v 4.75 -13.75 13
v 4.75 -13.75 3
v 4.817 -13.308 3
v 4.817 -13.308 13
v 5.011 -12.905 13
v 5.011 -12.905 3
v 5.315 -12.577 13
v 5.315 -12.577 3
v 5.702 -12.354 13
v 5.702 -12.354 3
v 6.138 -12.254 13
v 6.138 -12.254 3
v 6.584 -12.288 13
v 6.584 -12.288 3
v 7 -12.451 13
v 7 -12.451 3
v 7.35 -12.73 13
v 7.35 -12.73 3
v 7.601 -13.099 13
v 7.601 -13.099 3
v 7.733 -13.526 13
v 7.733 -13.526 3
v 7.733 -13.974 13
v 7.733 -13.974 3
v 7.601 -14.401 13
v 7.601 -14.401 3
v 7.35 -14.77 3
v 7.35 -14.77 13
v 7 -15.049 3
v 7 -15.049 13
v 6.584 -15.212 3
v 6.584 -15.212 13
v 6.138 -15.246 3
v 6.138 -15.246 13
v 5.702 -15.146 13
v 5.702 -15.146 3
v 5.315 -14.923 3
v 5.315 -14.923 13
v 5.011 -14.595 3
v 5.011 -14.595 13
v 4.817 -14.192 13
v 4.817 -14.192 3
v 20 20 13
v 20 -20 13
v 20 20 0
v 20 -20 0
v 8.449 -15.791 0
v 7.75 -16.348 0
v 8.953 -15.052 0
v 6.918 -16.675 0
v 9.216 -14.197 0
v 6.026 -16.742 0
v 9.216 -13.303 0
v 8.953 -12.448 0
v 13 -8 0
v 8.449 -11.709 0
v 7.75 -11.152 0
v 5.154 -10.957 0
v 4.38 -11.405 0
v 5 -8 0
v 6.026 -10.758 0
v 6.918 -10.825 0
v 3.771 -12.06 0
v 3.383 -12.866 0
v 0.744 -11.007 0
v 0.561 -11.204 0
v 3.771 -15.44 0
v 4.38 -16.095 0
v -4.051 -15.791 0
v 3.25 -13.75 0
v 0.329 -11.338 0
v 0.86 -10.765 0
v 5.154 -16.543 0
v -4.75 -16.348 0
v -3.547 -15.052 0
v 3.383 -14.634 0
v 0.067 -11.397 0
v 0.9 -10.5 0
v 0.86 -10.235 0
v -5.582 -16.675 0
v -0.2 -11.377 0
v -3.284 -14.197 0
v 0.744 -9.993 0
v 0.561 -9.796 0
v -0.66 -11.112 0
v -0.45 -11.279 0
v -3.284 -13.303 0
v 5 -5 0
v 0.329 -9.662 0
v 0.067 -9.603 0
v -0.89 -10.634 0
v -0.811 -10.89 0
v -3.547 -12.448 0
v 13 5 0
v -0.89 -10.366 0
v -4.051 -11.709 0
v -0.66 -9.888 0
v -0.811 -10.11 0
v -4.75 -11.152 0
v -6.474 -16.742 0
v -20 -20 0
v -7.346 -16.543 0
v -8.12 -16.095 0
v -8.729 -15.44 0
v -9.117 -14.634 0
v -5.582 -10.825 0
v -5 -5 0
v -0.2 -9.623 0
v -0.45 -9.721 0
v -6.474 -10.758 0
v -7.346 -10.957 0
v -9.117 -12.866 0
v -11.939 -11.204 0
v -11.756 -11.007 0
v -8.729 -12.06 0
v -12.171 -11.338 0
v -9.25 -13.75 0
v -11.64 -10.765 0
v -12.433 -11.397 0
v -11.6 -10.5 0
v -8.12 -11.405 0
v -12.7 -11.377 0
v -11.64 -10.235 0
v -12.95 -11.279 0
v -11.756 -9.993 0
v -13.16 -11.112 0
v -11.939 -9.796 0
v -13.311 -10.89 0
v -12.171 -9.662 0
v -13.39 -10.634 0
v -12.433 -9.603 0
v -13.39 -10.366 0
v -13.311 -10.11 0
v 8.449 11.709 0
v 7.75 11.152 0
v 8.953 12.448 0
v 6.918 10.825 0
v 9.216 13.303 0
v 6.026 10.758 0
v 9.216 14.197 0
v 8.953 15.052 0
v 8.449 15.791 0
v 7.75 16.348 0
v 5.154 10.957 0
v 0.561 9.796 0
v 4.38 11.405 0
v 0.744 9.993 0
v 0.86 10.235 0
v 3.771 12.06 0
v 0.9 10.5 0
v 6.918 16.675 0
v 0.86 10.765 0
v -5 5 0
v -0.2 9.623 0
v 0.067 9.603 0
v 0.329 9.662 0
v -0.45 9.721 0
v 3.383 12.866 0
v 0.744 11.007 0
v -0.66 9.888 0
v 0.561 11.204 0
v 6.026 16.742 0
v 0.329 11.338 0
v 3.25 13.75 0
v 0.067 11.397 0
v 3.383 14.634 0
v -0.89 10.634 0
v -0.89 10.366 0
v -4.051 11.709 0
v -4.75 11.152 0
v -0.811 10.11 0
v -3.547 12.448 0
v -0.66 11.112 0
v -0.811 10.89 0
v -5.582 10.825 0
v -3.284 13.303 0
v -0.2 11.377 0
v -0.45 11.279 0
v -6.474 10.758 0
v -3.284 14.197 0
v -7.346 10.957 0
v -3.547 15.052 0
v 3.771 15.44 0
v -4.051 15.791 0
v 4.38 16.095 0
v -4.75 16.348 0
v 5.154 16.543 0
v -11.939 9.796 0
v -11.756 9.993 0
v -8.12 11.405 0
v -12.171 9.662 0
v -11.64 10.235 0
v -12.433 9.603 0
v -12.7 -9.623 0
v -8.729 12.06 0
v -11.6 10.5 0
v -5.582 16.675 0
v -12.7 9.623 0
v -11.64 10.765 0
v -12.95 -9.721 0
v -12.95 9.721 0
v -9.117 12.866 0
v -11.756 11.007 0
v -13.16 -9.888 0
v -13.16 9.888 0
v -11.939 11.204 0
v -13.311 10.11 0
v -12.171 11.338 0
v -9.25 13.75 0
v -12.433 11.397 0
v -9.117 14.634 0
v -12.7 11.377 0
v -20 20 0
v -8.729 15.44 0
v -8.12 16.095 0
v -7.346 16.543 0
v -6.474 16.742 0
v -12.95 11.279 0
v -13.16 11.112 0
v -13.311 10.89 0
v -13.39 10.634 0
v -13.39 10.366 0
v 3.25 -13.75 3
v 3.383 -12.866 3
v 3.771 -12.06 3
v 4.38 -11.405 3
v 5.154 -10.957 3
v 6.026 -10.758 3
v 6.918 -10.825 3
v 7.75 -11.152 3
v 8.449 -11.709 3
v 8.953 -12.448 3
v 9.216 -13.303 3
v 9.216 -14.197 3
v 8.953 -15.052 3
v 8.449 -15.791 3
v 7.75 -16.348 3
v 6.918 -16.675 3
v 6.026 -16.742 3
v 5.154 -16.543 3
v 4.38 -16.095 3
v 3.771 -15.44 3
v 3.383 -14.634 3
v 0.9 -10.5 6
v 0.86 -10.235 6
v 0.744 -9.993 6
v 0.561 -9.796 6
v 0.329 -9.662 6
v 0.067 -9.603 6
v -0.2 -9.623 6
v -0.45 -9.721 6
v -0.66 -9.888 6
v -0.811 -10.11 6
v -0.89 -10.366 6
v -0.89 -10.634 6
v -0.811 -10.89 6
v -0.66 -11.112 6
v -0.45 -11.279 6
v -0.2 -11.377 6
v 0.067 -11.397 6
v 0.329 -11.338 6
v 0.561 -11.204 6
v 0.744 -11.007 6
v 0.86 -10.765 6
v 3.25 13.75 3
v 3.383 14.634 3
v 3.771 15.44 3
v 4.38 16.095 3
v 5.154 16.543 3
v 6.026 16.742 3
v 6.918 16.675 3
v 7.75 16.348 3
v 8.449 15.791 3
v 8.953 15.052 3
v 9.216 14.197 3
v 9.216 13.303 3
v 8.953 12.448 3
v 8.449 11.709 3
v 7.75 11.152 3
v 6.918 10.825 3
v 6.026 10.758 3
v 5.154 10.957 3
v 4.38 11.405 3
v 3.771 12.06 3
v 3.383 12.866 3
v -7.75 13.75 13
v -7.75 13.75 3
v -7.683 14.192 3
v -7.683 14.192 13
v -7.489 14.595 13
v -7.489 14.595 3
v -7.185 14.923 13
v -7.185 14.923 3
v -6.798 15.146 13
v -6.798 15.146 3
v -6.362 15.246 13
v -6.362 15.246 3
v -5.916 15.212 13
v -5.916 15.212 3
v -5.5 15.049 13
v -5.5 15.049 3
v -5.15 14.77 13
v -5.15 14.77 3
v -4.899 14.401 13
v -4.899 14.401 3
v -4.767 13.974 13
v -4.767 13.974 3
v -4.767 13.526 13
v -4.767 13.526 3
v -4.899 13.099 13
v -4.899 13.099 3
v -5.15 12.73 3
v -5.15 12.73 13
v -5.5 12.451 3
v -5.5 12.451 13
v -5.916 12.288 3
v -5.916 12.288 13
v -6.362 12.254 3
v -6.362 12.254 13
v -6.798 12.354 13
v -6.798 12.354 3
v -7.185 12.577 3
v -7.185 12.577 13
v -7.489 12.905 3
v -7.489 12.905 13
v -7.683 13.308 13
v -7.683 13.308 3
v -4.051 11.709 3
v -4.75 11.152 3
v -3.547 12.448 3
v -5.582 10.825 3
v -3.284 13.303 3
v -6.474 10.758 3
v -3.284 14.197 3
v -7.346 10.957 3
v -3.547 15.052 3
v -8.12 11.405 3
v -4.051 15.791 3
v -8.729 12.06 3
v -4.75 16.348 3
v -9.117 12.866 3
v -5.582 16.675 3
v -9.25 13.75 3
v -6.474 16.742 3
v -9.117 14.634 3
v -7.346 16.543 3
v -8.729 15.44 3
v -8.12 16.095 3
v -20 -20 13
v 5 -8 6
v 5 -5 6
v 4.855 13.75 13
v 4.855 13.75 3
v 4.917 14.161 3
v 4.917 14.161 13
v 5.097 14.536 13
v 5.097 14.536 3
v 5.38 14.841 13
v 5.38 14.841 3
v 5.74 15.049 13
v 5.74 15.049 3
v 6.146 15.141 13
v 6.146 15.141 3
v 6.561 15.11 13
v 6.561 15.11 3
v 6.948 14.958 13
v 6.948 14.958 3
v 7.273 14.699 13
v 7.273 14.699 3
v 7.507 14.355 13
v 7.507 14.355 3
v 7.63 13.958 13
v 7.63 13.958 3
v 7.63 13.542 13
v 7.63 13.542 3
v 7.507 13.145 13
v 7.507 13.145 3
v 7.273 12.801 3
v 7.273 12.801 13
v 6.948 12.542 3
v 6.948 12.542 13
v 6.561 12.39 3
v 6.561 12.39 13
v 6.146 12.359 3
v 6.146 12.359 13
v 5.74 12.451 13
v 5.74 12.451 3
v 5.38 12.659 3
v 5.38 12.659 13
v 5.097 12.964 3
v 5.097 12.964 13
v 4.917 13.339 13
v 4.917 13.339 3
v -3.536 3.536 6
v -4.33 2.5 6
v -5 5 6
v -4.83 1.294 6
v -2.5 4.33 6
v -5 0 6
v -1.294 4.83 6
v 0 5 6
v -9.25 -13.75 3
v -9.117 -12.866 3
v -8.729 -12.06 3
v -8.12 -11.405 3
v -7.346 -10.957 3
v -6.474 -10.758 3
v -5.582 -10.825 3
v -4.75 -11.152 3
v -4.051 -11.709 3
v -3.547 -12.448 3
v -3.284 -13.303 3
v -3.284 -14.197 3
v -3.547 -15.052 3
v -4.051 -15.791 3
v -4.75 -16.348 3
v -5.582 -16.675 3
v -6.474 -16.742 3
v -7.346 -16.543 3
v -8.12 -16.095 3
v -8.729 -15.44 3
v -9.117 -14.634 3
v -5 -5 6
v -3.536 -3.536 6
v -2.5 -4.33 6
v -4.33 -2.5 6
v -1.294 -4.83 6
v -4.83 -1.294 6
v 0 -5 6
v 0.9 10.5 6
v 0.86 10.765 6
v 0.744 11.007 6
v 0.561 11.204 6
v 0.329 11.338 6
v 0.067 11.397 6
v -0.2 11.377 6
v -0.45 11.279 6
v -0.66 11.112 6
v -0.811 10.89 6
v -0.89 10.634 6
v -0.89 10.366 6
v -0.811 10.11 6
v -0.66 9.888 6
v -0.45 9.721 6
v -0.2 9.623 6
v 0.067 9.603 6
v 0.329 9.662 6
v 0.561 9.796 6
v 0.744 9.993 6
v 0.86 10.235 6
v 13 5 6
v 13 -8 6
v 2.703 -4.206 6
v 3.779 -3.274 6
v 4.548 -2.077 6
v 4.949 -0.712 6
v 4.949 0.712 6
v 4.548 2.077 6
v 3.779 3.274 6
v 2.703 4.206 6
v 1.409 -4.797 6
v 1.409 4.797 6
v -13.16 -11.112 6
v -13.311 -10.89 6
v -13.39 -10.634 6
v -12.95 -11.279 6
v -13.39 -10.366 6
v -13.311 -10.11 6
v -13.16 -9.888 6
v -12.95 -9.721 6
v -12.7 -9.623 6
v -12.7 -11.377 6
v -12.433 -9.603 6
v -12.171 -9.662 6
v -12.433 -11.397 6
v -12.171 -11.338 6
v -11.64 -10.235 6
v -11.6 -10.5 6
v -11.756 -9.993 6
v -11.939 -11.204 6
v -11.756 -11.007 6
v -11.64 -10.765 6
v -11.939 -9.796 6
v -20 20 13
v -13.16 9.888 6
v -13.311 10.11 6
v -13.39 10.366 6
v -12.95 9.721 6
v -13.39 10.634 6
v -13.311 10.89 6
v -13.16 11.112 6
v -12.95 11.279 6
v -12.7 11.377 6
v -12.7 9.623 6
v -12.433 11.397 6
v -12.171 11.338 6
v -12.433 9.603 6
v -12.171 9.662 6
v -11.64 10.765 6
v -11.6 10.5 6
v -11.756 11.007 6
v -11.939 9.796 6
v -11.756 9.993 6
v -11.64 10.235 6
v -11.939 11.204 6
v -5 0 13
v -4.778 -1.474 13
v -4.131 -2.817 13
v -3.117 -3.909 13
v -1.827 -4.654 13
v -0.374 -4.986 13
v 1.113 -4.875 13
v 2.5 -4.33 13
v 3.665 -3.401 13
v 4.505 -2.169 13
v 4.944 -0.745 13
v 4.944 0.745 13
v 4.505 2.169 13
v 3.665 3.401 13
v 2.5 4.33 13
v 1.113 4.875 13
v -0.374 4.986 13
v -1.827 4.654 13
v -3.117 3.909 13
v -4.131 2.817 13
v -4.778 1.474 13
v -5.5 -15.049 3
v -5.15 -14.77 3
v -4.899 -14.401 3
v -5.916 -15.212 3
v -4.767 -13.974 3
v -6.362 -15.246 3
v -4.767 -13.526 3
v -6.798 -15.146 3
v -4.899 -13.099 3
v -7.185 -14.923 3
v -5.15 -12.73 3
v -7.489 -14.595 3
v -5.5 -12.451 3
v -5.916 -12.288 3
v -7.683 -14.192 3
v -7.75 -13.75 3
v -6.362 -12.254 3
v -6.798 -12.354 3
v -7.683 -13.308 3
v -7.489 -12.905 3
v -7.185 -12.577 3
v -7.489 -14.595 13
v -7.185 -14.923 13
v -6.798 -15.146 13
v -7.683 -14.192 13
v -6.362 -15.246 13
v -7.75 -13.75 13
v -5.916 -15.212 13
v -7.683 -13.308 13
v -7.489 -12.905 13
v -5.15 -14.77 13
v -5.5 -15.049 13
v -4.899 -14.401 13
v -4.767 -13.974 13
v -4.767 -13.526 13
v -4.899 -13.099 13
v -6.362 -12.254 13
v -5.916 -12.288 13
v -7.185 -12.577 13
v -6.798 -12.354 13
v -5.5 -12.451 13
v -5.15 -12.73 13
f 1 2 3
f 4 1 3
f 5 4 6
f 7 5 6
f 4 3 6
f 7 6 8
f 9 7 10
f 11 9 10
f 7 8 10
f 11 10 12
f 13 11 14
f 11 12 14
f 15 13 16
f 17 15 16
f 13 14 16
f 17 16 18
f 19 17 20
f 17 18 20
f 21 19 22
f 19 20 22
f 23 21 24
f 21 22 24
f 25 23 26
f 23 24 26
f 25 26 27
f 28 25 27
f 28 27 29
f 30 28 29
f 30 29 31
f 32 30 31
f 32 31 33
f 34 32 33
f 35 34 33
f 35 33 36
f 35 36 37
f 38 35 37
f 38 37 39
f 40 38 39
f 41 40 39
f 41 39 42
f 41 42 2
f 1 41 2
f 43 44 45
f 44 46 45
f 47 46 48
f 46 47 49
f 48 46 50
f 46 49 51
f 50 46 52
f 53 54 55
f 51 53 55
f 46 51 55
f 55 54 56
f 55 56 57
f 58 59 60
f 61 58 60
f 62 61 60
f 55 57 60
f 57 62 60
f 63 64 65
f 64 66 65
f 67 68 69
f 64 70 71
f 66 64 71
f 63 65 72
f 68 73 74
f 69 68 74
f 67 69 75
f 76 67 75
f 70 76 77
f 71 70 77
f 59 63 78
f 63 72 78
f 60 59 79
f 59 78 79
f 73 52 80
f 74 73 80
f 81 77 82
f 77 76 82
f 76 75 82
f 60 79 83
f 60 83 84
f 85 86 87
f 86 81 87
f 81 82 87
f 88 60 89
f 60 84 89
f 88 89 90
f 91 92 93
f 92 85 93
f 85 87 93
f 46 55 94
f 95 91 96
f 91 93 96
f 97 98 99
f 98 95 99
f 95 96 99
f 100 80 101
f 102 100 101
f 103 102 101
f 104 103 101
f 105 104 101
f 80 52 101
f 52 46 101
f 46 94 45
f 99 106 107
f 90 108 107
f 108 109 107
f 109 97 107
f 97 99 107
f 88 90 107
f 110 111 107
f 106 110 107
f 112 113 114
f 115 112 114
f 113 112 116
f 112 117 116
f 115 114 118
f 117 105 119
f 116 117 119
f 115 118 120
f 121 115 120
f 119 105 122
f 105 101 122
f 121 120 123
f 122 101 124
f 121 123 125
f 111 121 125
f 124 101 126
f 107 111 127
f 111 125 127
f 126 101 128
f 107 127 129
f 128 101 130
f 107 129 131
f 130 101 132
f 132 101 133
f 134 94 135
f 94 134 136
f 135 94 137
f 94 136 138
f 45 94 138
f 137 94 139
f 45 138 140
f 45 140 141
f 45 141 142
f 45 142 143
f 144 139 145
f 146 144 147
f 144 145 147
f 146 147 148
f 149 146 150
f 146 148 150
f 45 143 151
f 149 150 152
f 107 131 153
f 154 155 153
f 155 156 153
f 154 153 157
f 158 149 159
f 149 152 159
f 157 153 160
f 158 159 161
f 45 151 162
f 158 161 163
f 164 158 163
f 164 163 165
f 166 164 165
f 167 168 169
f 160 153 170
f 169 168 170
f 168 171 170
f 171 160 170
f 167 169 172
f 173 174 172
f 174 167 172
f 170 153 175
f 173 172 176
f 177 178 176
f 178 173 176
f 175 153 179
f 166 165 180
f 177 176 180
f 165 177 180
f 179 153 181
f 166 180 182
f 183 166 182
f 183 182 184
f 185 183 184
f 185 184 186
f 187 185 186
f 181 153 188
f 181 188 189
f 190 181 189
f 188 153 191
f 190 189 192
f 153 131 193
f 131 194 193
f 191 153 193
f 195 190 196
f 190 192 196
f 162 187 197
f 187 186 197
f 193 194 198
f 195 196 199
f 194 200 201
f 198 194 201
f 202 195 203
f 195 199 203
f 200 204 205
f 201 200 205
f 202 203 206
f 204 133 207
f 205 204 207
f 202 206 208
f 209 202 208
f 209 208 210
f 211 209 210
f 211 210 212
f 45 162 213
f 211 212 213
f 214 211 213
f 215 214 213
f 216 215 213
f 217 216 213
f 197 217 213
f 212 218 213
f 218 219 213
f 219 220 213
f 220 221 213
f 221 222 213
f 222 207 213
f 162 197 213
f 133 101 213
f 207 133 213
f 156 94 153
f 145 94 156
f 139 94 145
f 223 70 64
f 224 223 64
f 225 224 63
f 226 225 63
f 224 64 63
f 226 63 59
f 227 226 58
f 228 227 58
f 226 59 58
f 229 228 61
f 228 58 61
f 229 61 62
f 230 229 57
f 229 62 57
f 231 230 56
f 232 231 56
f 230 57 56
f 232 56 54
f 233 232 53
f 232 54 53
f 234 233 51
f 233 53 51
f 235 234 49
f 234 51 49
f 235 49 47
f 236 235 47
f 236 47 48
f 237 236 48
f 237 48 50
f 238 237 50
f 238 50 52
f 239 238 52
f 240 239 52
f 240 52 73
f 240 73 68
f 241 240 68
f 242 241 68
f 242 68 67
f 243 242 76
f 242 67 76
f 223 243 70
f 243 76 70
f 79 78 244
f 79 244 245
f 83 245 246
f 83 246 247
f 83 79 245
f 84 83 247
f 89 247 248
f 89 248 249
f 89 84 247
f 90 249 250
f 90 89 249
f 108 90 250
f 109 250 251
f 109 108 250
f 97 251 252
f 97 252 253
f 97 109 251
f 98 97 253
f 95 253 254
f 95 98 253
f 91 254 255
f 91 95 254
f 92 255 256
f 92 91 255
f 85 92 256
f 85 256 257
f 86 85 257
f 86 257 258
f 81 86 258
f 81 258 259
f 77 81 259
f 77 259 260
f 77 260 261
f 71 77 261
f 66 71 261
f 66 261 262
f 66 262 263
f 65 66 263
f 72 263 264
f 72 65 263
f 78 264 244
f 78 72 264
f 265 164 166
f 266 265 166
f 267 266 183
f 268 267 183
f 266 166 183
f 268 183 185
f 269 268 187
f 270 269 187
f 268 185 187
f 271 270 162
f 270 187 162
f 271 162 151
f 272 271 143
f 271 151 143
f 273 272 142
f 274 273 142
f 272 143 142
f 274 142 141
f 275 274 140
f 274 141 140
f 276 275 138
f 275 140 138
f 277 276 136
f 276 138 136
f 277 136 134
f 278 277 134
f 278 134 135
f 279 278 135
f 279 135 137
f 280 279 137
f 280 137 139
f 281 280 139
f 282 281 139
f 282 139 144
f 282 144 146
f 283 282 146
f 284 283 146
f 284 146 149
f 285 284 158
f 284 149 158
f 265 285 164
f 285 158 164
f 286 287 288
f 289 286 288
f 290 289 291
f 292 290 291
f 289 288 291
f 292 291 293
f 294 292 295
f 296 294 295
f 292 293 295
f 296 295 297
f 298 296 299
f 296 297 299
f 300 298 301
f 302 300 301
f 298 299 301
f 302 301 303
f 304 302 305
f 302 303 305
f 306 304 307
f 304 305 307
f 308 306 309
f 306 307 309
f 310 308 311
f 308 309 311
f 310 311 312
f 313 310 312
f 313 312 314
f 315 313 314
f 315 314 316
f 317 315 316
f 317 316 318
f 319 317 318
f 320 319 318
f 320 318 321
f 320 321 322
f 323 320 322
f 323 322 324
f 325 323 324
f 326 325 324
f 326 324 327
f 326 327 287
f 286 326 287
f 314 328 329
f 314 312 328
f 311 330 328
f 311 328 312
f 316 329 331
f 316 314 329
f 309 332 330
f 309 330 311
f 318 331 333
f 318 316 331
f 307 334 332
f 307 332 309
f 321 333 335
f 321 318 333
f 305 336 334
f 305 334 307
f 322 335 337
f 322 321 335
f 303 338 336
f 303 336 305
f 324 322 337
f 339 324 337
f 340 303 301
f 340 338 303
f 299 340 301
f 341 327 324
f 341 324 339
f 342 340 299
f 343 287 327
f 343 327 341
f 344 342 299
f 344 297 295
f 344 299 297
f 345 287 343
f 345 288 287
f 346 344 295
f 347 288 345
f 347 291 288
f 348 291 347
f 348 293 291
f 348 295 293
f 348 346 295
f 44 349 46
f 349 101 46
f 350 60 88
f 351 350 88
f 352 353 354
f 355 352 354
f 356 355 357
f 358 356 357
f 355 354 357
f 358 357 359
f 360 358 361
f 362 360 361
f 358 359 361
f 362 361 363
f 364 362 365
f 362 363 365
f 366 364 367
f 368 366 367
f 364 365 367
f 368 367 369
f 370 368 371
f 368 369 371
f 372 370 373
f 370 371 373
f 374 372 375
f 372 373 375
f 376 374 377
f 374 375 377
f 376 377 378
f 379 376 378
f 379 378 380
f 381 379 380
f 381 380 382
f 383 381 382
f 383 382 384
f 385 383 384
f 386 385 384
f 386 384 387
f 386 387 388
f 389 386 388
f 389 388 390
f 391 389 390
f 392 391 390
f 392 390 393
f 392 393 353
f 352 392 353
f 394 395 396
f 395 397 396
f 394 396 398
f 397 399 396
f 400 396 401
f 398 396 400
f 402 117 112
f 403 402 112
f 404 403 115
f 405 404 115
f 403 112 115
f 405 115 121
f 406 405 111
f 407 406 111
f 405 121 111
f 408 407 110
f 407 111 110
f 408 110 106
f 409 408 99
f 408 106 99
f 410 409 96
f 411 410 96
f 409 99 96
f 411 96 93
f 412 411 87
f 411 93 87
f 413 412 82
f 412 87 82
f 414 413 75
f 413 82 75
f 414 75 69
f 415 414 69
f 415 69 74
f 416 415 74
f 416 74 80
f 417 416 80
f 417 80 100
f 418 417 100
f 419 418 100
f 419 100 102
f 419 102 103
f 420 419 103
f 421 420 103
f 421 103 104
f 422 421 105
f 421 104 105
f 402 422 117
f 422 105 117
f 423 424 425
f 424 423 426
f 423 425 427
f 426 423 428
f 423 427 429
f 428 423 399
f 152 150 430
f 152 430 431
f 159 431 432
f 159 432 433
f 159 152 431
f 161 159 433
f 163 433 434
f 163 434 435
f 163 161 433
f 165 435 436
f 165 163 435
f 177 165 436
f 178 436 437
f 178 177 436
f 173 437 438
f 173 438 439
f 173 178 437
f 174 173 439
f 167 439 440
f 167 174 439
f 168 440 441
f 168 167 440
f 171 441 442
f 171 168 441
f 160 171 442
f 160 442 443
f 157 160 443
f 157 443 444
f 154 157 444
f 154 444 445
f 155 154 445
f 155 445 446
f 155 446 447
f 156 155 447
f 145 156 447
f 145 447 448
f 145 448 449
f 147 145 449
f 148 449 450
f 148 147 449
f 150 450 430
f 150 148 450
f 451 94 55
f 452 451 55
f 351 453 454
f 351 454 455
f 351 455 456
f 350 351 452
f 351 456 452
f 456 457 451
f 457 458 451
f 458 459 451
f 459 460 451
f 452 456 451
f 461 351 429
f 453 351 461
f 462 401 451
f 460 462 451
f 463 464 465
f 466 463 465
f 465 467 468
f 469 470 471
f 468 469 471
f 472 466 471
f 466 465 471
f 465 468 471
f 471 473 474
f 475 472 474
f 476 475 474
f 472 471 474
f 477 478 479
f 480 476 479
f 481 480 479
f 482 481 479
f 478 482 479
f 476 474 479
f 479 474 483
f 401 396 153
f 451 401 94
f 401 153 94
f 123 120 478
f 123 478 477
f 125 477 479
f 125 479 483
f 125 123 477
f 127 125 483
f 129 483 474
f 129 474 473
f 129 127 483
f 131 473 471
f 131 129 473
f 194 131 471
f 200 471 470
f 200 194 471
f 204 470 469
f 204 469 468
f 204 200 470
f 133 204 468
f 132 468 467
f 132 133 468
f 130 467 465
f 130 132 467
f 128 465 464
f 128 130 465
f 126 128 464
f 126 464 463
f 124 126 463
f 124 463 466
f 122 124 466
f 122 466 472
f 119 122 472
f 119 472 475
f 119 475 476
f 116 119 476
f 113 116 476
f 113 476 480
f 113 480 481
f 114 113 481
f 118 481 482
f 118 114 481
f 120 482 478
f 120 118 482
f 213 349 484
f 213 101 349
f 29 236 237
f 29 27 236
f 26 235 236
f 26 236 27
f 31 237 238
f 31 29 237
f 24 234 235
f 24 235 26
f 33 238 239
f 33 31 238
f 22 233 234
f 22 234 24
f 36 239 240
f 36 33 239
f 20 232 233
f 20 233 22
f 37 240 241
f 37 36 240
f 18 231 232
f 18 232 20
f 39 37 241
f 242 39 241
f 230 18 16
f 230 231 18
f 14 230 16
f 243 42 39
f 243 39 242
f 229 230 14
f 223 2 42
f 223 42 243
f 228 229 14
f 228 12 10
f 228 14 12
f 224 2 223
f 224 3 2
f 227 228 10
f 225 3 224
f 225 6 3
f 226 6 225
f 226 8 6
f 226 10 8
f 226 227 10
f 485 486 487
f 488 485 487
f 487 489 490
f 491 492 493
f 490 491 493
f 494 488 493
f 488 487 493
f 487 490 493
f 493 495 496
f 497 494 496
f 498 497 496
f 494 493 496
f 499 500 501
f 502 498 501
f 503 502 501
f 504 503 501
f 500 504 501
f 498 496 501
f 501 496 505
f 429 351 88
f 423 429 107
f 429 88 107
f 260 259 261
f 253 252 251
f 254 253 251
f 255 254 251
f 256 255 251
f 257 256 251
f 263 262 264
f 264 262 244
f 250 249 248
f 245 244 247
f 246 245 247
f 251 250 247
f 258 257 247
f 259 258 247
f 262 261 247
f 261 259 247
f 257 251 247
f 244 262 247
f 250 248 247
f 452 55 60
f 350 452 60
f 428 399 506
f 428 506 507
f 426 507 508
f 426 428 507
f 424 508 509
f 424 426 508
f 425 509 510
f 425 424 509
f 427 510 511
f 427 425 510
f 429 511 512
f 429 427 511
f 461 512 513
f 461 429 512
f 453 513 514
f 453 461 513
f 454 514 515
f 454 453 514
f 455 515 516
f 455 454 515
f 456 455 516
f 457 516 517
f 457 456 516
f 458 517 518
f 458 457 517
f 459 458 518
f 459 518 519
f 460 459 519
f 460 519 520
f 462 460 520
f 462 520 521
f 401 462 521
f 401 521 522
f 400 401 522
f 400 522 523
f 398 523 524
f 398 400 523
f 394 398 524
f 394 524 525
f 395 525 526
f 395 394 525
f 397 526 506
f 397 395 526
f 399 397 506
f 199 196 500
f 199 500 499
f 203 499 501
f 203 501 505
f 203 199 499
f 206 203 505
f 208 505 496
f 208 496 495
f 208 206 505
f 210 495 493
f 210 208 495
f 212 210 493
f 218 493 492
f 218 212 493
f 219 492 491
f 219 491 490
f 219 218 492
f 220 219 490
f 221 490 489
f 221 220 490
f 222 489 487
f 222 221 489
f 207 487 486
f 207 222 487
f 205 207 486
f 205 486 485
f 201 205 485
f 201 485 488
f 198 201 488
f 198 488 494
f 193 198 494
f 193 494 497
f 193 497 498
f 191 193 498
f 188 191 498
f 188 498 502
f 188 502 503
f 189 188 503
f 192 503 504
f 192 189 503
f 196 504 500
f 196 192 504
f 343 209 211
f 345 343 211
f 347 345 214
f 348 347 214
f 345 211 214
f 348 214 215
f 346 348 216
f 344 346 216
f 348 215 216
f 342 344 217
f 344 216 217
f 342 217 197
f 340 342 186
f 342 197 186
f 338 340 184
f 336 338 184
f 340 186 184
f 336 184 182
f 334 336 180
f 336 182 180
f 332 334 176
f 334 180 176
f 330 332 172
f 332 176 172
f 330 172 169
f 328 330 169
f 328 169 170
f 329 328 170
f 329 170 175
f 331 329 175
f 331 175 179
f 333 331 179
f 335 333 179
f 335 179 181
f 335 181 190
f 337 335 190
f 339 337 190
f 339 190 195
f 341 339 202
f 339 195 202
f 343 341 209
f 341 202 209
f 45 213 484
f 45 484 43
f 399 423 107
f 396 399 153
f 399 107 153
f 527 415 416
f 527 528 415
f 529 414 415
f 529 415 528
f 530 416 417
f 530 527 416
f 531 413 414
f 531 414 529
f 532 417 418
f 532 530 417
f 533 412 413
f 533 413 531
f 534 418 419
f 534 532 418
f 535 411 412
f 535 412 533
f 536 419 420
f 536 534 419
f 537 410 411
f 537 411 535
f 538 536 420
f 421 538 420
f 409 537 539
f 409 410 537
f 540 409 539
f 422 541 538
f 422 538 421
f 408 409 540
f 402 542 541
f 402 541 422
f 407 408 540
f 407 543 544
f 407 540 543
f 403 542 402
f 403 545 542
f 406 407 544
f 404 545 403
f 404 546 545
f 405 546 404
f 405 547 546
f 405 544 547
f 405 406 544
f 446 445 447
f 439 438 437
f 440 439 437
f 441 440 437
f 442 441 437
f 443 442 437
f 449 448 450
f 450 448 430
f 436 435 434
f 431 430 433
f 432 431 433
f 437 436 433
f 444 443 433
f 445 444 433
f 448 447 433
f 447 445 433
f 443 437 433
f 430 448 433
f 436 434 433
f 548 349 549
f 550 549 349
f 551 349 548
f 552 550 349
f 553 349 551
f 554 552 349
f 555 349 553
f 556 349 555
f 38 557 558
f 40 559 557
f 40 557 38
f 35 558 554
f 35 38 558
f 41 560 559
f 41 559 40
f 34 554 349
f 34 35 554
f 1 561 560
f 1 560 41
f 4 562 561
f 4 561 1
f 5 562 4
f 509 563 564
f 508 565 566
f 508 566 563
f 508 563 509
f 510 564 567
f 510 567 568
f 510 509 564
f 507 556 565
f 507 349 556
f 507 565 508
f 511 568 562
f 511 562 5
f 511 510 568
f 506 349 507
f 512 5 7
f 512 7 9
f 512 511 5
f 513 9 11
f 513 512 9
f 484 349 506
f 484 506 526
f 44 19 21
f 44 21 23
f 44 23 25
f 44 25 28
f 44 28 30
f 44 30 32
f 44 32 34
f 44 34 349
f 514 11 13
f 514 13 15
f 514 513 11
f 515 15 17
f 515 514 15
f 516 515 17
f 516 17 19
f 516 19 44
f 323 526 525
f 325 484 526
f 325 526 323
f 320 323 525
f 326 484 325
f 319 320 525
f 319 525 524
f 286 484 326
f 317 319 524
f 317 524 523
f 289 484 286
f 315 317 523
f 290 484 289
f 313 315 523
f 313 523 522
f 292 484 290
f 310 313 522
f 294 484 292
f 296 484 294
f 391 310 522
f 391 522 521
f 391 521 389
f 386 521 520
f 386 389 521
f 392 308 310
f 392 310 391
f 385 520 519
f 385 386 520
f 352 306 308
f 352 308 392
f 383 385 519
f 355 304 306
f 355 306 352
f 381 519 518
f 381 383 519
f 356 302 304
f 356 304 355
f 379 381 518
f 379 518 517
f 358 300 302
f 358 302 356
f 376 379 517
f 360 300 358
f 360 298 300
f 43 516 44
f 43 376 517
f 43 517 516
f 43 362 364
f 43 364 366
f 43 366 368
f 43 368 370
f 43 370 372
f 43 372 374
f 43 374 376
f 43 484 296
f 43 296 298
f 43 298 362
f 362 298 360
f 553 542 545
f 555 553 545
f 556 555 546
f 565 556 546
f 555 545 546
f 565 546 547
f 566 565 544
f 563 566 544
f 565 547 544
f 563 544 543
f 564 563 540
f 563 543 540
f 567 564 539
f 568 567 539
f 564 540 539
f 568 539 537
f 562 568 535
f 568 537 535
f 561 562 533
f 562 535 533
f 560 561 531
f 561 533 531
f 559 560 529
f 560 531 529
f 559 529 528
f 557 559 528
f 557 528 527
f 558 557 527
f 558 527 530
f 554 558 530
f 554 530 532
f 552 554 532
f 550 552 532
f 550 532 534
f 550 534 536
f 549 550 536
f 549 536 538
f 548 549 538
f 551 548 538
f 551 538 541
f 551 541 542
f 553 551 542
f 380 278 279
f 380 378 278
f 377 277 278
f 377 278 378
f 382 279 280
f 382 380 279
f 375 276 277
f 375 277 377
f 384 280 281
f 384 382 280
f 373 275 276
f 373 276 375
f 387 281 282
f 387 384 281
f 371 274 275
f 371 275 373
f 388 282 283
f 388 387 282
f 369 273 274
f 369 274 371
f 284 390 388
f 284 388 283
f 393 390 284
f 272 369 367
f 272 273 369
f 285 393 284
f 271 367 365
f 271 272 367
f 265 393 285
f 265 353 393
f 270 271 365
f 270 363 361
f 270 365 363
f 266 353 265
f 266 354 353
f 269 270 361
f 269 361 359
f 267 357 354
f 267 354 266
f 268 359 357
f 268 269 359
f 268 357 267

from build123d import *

# Parameters (mm, degrees)
SKETCH1_W           = 40
SKETCH1_H           = 40
SKETCH1_R           = 0.9
BOSS_EXTRUDE1_DEPTH = 6
SKETCH11_W          = 40
SKETCH11_H          = 40
SKETCH11_R          = 5
BOSS_EXTRUDE6_DEPTH = 7
SKETCH13_R          = 1.5
SKETCH13_R_2        = 1.395390764
CUT_EXTRUDE5_DEPTH  = 27
SKETCH13_3_R        = 3
SKETCH13_3_R_2      = 1.5
CUT_EXTRUDE6_DEPTH  = 3


with BuildPart() as part:
    # Sketch1 → Boss-Extrude1 (new body)
    with BuildSketch(Plane(origin=(0, 0, 0), x_dir=(0, 1, 0), z_dir=(0, 0, 1))):
        Rectangle(SKETCH1_W, SKETCH1_H)
        Polygon((-5, -5), (-5, 5), (5, 5), (5, -5), (5, -13), (-5, -13), (-8, -13), (-8, -5), align=None, mode=Mode.SUBTRACT)
        with Locations((10.5, 0)):
            Circle(SKETCH1_R, mode=Mode.SUBTRACT)
        with Locations((-10.5, 0)):
            Circle(SKETCH1_R, mode=Mode.SUBTRACT)
        with Locations((-10.5, 12.5)):
            Circle(SKETCH1_R, mode=Mode.SUBTRACT)
        with Locations((10.5, 12.5)):
            Circle(SKETCH1_R, mode=Mode.SUBTRACT)
    extrude(amount=BOSS_EXTRUDE1_DEPTH)

    # Sketch11 → Boss-Extrude6 (add)
    with BuildSketch(Plane.XY.offset(6)):
        Rectangle(SKETCH11_W, SKETCH11_H)
        Circle(SKETCH11_R, mode=Mode.SUBTRACT)
    extrude(amount=BOSS_EXTRUDE6_DEPTH)

    # Sketch13 → Cut-Extrude5 (cut)
    with BuildSketch(Plane(origin=(0, 0, 0), x_dir=(1, 0, 0), z_dir=(0, 0, -1))):
        with Locations((-6.25, 13.75)):
            Circle(SKETCH13_R)
        with Locations((6.25, 13.75)):
            Circle(SKETCH13_R)
        with Locations((-6.25, -13.75)):
            Circle(SKETCH13_R)
        with Locations((6.25, -13.75)):
            Circle(SKETCH13_R_2)
    extrude(amount=-CUT_EXTRUDE5_DEPTH, mode=Mode.SUBTRACT)

    # Sketch13<3> → Cut-Extrude6 (cut)
    # profile 1 of 4: a face of its own
    with BuildSketch(Plane(origin=(0, 0, 0), x_dir=(1, 0, 0), z_dir=(0, 0, -1))):
        with Locations((6.25, -13.75)):
            Circle(SKETCH13_3_R)
    # profile 2 of 4: a face of its own
    with BuildSketch(Plane(origin=(0, 0, 0), x_dir=(1, 0, 0), z_dir=(0, 0, -1))):
        with Locations((-6.25, 13.75)):
            Circle(SKETCH13_3_R)
        with Locations((-6.25, 13.75)):
            Circle(SKETCH13_3_R_2, mode=Mode.SUBTRACT)
    # profile 3 of 4: a face of its own
    with BuildSketch(Plane(origin=(0, 0, 0), x_dir=(1, 0, 0), z_dir=(0, 0, -1))):
        with Locations((6.25, 13.75)):
            Circle(SKETCH13_3_R)
        with Locations((6.25, 13.75)):
            Circle(SKETCH13_3_R_2, mode=Mode.SUBTRACT)
    # profile 4 of 4: a face of its own
    with BuildSketch(Plane(origin=(0, 0, 0), x_dir=(1, 0, 0), z_dir=(0, 0, -1))):
        with Locations((-6.25, -13.75)):
            Circle(SKETCH13_3_R)
        with Locations((-6.25, -13.75)):
            Circle(SKETCH13_3_R_2, mode=Mode.SUBTRACT)
    extrude(amount=-CUT_EXTRUDE6_DEPTH, mode=Mode.SUBTRACT)


solid = part.part
